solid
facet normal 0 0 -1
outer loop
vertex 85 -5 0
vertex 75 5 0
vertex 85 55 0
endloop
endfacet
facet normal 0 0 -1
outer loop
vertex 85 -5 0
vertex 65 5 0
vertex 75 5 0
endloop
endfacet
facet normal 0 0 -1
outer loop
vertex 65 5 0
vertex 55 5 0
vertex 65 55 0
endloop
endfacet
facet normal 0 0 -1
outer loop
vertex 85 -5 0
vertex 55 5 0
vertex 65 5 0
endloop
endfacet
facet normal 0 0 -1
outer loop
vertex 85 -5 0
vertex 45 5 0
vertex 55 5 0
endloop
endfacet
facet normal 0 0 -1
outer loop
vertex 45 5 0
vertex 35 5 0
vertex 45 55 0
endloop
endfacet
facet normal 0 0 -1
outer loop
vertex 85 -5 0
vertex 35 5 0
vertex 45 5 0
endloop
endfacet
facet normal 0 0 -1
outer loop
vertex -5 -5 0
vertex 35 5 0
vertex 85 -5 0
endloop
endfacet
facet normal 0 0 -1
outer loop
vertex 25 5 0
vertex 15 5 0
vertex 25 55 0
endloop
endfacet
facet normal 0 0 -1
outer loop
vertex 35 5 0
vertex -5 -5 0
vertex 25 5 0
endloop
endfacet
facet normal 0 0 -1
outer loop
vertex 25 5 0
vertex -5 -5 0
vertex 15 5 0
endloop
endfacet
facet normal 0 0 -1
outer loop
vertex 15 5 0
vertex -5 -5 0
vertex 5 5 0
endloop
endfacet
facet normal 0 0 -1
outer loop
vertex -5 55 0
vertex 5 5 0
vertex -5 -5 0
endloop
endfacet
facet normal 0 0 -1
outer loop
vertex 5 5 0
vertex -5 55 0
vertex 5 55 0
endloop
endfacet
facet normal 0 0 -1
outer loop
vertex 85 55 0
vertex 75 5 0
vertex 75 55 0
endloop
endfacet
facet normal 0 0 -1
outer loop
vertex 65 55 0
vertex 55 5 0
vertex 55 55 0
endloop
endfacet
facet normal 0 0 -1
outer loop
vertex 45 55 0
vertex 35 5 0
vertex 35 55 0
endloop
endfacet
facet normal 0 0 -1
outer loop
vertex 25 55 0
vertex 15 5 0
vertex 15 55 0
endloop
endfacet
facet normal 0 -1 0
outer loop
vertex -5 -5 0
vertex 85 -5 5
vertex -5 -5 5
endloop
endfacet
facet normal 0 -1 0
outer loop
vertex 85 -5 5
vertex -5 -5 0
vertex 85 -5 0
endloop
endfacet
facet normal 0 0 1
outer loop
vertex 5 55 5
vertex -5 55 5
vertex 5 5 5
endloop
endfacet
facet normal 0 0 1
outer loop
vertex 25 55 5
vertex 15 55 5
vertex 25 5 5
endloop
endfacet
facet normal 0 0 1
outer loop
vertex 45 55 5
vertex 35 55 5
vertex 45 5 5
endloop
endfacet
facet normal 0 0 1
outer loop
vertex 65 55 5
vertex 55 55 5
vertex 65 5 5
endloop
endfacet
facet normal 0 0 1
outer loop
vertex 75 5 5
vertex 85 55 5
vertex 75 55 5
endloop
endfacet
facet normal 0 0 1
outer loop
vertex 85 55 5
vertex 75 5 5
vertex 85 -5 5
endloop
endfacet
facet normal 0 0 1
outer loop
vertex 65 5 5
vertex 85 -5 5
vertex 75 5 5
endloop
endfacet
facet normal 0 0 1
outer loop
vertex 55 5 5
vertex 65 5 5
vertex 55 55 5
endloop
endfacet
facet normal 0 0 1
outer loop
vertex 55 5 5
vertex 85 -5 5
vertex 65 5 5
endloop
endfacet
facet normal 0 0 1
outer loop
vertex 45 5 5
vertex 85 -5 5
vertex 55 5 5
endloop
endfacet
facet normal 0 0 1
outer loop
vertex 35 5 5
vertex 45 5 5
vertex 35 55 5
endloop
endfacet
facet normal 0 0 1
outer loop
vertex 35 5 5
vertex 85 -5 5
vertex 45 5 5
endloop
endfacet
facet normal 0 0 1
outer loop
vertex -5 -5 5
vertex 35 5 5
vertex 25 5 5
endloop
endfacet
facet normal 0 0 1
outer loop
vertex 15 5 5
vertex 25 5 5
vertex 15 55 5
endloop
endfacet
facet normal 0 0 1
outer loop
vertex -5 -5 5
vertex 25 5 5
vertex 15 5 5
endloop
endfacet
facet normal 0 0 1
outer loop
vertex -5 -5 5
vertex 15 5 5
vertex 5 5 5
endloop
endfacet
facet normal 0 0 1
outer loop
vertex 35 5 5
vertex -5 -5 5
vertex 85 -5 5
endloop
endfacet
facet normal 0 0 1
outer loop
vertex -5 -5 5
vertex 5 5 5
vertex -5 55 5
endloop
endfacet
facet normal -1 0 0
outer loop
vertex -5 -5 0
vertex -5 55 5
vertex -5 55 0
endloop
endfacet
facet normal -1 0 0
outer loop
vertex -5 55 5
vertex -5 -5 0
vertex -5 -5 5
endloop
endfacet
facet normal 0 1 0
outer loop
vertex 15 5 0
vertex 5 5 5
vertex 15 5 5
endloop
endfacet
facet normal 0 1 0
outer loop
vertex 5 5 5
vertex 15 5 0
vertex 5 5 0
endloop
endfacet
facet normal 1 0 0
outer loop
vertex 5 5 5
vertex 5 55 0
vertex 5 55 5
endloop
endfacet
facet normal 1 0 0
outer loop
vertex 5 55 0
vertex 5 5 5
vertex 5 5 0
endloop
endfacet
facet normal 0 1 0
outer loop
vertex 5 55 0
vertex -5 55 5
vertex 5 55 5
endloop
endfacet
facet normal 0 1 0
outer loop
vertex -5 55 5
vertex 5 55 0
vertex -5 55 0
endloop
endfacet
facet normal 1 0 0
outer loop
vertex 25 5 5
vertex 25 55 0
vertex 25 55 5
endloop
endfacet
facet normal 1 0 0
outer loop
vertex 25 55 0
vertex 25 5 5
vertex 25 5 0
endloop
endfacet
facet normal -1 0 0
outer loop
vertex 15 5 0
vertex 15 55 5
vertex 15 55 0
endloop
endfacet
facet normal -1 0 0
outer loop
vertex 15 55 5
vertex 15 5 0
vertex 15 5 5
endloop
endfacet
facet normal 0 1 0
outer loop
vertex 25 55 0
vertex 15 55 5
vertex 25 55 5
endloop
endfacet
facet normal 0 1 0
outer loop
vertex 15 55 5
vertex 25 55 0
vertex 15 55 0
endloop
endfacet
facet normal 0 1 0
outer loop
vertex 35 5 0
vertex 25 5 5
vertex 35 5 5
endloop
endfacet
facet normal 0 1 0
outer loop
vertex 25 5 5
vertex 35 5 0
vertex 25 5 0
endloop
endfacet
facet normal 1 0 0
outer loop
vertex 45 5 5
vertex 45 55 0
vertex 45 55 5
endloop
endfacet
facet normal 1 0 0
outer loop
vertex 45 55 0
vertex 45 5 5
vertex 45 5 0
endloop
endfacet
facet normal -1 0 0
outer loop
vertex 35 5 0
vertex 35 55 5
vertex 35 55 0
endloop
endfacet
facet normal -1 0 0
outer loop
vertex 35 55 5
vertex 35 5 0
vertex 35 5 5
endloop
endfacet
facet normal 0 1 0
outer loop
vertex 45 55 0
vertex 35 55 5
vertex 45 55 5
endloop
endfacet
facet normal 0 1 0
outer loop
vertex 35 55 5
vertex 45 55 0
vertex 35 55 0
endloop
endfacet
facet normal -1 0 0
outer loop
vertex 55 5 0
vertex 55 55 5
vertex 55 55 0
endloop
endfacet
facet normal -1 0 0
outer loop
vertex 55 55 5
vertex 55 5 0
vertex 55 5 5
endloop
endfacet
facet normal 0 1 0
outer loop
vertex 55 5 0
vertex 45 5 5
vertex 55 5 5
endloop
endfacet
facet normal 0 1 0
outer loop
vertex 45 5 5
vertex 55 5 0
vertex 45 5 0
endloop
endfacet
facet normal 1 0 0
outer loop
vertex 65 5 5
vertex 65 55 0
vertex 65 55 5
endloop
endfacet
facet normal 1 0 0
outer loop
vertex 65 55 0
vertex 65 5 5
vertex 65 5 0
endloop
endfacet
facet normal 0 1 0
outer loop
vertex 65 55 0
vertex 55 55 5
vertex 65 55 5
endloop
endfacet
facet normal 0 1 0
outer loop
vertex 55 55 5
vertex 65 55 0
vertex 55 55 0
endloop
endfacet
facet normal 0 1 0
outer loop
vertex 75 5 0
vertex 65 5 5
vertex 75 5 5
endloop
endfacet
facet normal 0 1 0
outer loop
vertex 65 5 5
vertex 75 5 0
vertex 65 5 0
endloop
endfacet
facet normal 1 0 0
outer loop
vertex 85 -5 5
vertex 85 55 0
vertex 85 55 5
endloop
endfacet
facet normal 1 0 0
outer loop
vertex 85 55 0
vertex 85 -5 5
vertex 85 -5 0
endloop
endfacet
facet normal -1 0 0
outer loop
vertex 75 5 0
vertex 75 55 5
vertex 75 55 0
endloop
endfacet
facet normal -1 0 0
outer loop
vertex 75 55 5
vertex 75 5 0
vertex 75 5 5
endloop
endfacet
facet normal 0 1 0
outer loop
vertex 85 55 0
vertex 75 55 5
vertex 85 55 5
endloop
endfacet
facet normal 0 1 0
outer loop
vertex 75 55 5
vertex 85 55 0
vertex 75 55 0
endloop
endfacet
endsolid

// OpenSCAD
// file: ../../src/semi_regular/tess_4_8_8.scad
/*
    Tessella: Semi-Regular Tessellation - 4.8.8
    ===========================================
    This module implements the tessellation of a plane using a semi-regular tiling
    pattern defined by the vertex configuration 4.8.8, where one square and two
    octagons meet at each vertex.
*/

include <../tessUtils.scad>;

/**
 * @brief Generates center points for an octagonal grid.
 *
 * Creates a 2D grid of center points for octagons spaced by the octagon's side length.
 *
 * @param radius The radius of each octagon.
 * @param n The number of octagons along the x-axis.
 * @param m The number of octagons along the y-axis.
 * @param rotate (Optional) Boolean to apply rotation to the grid, default is true.
 * @return An array of center points for octagons.
 */
function octagons_centers_rect(
    radius,
    n,
    m
) =
    let (
        side_length = (radius * 2) / (sqrt(4 + 2 * sqrt(2))), // Side length of the octagon
        total_width = side_length * (1 + sqrt(2)) // Total width including spacing
    ) squares_centers_rect(total_width, n, m);

/**
 * @brief Generates center points for the squares in a 4.8.8 tiling grid.
 *
 * Aligns the square centers with the octagonal centers by using a shifted grid,
 * creating the required semi-regular tiling pattern.
 *
 * @param radius The radius of the octagons.
 * @param n The number of octagons along the x-axis.
 * @param m The number of octagons along the y-axis.
 * @return An array of center points for squares.
 */
function squares_8_8_centers_rect(radius, n, m) =
    let (
        side_length = (radius * 2) / (sqrt(4 + 2 * sqrt(2))), // Side length of the octagon
        total_width = side_length * (1 + sqrt(2)), // Total width including spacing
        shift_x = total_width / 2, // Horizontal shift for squares
        shift_y = total_width / 2 // Vertical shift for squares
    ) [for (c = squares_centers_rect(total_width, n - 1, m - 1)) [c[0] + shift_x, c[1] + shift_y]];

/**
 * @brief Generates vertices for octagons based on radius and center points.
 *
 * Generates the vertices for octagons based on the provided center points and radius.
 *
 * @param radius The radius of each octagon.
 * @param centers Array of center points.
 * @param angular_offset (Optional) Rotation angle for vertices, default is 22.5°.
 * @return Array of vertices for each octagon.
 */
function octagons_vertices(radius, centers, angular_offset = 22.5) =
    [
        for (center = centers) [
            for (i = [0:7]) let (
                angle = i * 45 + angular_offset
            ) [center[0] + radius * cos(angle), center[1] + radius * sin(angle)],
        ],
    ];
// file: ../../src/regular/triangles.scad
/*
    Tessella: Regular Tessellation - Triangles
    ==========================================
    This module implements the tessellation of a plane using regular triangles,
    where each tile is congruent, and all vertex angles around a point sum to 360°.

    Polygon properties:
    - Sides: 3
    - Interior Angle: 60°
    - Vertex Configuration: 3.3.3.3.3.3

    Mathematically valid because the interior angle divides 360° exactly.
    Reference: Euclidean tessellation theory for regular polygons.
*/

include <../tessUtils.scad>;

/**
 * @brief Generates center points for a "levels-based" triangle arrangement.
 *
 * Creates a roughly radial or diamond-like pattern of triangle centers. The center row
 * has (2*levels - 1) triangles, each additional row above/below decreases by 1 triangle.
 *
 * @param side   The side length of each equilateral triangle.
 * @param levels Number of levels away from the center row.
 * @return       An array of center points for triangles.
 */
function triangles_centers_radial(side, levels) =
    let (
        // Vertical height of each triangle
        vheight = side * sqrt(3) / 2,
        // Generate rows symmetrically around the center
        rows0 = [
            for (i = [-ceil(levels / 2 - 1):ceil(levels / 2 - 1)])
            let (
                rowCount = (levels - ( (levels + 1) % 2)) - abs(i), // Number of triangles in the row
                yOff = i * vheight, // Vertical offset for the row
                xStart = -(rowCount - 1) * side / 2 // Horizontal start to center the row
            ) [[xStart, yOff], rowCount],
        ],
        rows1 = (levels == 1) ? []
        : [
            for (i = [-(floor(levels / 2)):(floor(levels / 2 - 1))])
            let (
                rowCount = (levels - ( (levels) % 2)) - abs(i), // Number of triangles in the row
                yOff = i * vheight + vheight / 2 - (vheight - sqrt(3) / 3 * side) / 2, // Vertical offset for the row
                xStart = -(rowCount - 1) * side / 2 // Horizontal start to center the row
            ) [[xStart, yOff], rowCount],
        ],
        rows = concat(rows0, rows1)
    )
    // Generate center points for all rows
    [for (row = rows) for (j = [0:row[1] - 1]) [row[0][0] + j * side, row[0][1]]];

/**
 * @brief Generates center points for a rectangular grid of equilateral triangles (n x m).
 *
 * Alternating rows are horizontally offset by half a side for a typical triangular tiling pattern.
 *
 * @param side The side length of each triangle.
 * @param n    Number of triangles along x-axis.
 * @param m    Number of rows (y-axis).
 * @return     An array of center points for triangles.
 */
function triangles_centers_rect(side, n, m) =
    let (
        vheight = side * sqrt(3) / 2, // Vertical height of each triangle
        col_shift = side / 2, // Horizontal shift for each column
        row_shift = vheight, // Horizontal shift for alternating rows
        offset_shift = row_shift - (vheight - sqrt(3) / 3 * side) * 2
    ) [for (j = [0:m - 1], i = [0:n - 1]) [(i) * row_shift + (offset_shift * (j % 2)), j * col_shift]];

/**
 * @brief Generates vertices for equilateral triangles at specified centers.
 *
 * Rotates every other row by 180° and applies an additional angular offset for customization.
 *
 * @param side           The side length of each triangle.
 * @param centers        The array of center points for the triangles.
 * @param angular_offset An additional angular offset to apply to all triangles.
 * @param is_radial      If true, calculates the row index based on radial arrangement.
 * @return               A nested array of vertices for all triangles.
 */
function triangle_vertices(side, centers, angular_offset = 0, rect = true) =
    let (
        EPSILON = 1e-9, // Small value for floating-point comparison
        vheight = side * sqrt(3) / 2, // Vertical height of each triangle
        // This messy line pretty much determines if a row is odd or even based on the vertical position, it needs to check
        // using the reverse calculation of rows1 / offset shift, looking at that now it should probably be refactored.
        // Overall, this works and gets the geometrical idea across, but it's not the most readable (literally horrendous).
        row_parity = [
            for (c = centers) (
                (
                    ( ( ( (rect ? c[0] : c[1]) + EPSILON - vheight / 2 + (vheight - sqrt(3) / 3 * side) / 2) / vheight) % 1) <= EPSILON
                ) && (
                    (
                        ( ( (rect ? c[0] : c[1]) - EPSILON - vheight / 2 + (vheight - sqrt(3) / 3 * side) / 2) / vheight) % 1
                    ) >= -EPSILON
                ) ? 0
                : 1
            ),
        ], // Calculate row parity
        rotation_adjustment = [
            for (i = [0:len(centers) - 1]) (
                row_parity[i] ? (rect ? 0 : 180)
                : (rect ? 180 : 0)
            ),
        ] // Flip every other row
    ) [
            for (i = [0:len(centers) - 1]) [
                for (j = [0:2]) let (
                    angle = j * 120 + angular_offset + rotation_adjustment[i]
                ) [
                        centers[i][0] + side / sqrt(3) * cos(angle),
                        centers[i][1] + side / sqrt(3) * sin(angle),
                ],
            ],
    ];
// file: ../../src/regular/squares.scad
/*
    Tessella: Regular Tessellation - Squares
    ========================================
    This module implements the tessellation of a plane using regular squares,
    where each tile is congruent, and all vertex angles around a point sum to 360°.

    Polygon properties:
    - Sides: 4
    - Interior Angle: 90°
    - Vertex Configuration: 4.4.4.4
*/

include <../tessUtils.scad>;

/**
 * @brief Generates center points for a "levels-based" square arrangement.
 *
 * Creates a diamond-like pattern of square centers. The center (middle) row has (2*levels - 1) squares.
 * Each additional row above or below the center has one fewer square, until only 1 square remains at the
 * top and bottom (when levels > 1).
 *
 * @param side   The side length of each square.
 * @param levels Number of levels (rows above the center, plus the center, plus rows below).
 * @return       An array of center points for squares.
 */
function squares_centers_radial(side, levels) =
    let (
        // Offsets for spacing
        offset_x = side, // Horizontal spacing
        offset_y = side, // Vertical spacing

        // Generate rows from the center outward
        // Row i = -(levels-1) to +(levels-1), where i=0 is the center row.
        rows = [
            for (i = [-(levels - 1):(levels - 1)])
            let (
                rowCount = (2 * levels - 1) - abs(i), // Number of squares in the row
                yOff = i * offset_y, // Vertical position of the row
                xStart = -(rowCount - 1) * offset_x / 2 // Horizontal start to center the row
            ) [[xStart, yOff], rowCount],
        ]
    )
    // For each row definition, generate square center points
    [for (row = rows) for (j = [0:row[1] - 1]) [row[0][0] + j * offset_x, row[0][1]]];

/**
 * @brief Generates center points for a rectangular grid of squares (n x m).
 *
 * Produces a 2D grid of center points spaced by side length in both x and y directions.
 *
 * @param side The side length of each square.
 * @param n    The number of squares along the x-axis.
 * @param m    The number of squares along the y-axis.
 * @return     An array of center points for squares.
 */
function squares_centers_rect(side, n, m) =
    let (offset_x = side, offset_y = side) [for (ix = [0:n - 1], iy = [0:m - 1]) [ix * offset_x, iy * offset_y]];

/**
 * @brief Renders 2D squares at specified centers, with optional color gradient.
 *
 * @param side          The side length of each square.
 * @param spacing       (Optional) Spacing between squares, default is 0.
 * @param centers       (Optional) Array of center points. If empty, `levels` or (n,m) must be provided.
 * @param levels        (Optional) Number of levels for diamond-like pattern generation.
 * @param n, m          (Optional) Grid dimensions if using NxM generation.
 * @param color_scheme  (Optional) Name of the color scheme for gradient.
 * @param alpha         (Optional) Alpha transparency value.
 */

function squares_vertices(side, centers, angular_offset = 45) =
    [
        for (
            center = centers
        ) [
            for (i = [0:3]) let (angle = i * 90 + angular_offset) [
                    center[0] + side / sqrt(2) * cos(angle),
                    center[1] + side / sqrt(2) * sin(angle),
            ],
        ],
    ];
// file: ../../src/regular/hexagons.scad
/*
    Tessella: Regular Tessellation - Hexagons
    =========================================
    Tessellates a plane using regular hexagons.
    Properties:
    - Sides: 6
    - Interior Angle: 120°
    - Vertex Configuration: 6.6.6
*/

include <../tessUtils.scad>;

/**
 * Generates center points for a hexagonal tessellation in a radial pattern.
 * @param radius The radius of each hexagon.
 * @param levels Number of radial levels.
 * @return Array of hexagon center points.
 */
function hexagons_centers_radial(radius, levels) =
    let (
        offset_x = radius * cos(30),
        offset_y = radius + radius * sin(30),
        offset_step = 2 * offset_x,
        dx = -(levels - 1) * offset_x * 2,
        beginning_n = 2 * levels - 1,
        hexagons_pts = function(hex_datum)
        let (
            tx = hex_datum[0][0] + dx,
            ty = hex_datum[0][1],
            n_pts = hex_datum[1],
            offset_xs = [for (i = [0:n_pts - 1]) i * offset_step]
        ) [for (x = offset_xs) [x + tx, ty]],
        upper_hex_data = levels > 1 ? [
                for (i = [1:beginning_n - levels]) let (
                    x = offset_x * i,
                    y = offset_y * i,
                    n_upper = beginning_n - i
                ) [[x, y], n_upper],
            ]
        : [],
        lower_hex_data = levels > 1 ? [for (hex_datum = upper_hex_data) [[hex_datum[0][0], -hex_datum[0][1]], hex_datum[1]]]
        : [],
        total_hex_data = [[[0, 0], beginning_n], each upper_hex_data, each lower_hex_data],
        centers = [for (hex_datum = total_hex_data) hexagons_pts(hex_datum)]
    ) concat([for (c = centers) each c]);

/**
 * Generates center points for a rectangular hexagonal grid.
 * @param radius The radius of each hexagon.
 * @param n Number of hexagons along x-axis.
 * @param m Number of hexagons along y-axis.
 * @return Array of hexagon center points.
 */
function hexagons_centers_rect(radius, n, m) =
    let (
        offset_x = radius * cos(30),
        offset_y = radius + radius * sin(30),
        offset_step = 2 * offset_x
    ) [for (i = [0:n - 1], j = [0:m - 1]) [i * offset_step + (j % 2) * (offset_step / 2), j * offset_y]];

/**
 * Generates vertices for hexagons based on radius and center points.
 * @param radius The radius of each hexagon.
 * @param centers Array of center points.
 * @param angular_offset Rotation angle for vertices.
 * @return Array of vertices for each hexagon.
 */
function hexagons_vertices(radius, centers, angular_offset = 30) =
    [
        for (center = centers) [
            for (i = [0:5]) let (
                angle = i * 60 + angular_offset
            ) [center[0] + radius * cos(angle), center[1] + radius * sin(angle)],
        ],
    ];
// file: ../../src/tessUtils.scad
EPSILON = 1e-3; ///< Tolerance value used for floating-point comparisons.

/**
 * @brief Generates a gradient color based on normalized coordinates and a color scheme.
 *
 * Selects a color by mapping normalized x and y coordinates to RGB values according to the specified color scheme.
 *
 * @param normalized_x The normalized x-coordinate (0 to 1).
 * @param normalized_y The normalized y-coordinate (0 to 1).
 * @param color_scheme The name of the color scheme to use.
 * @return An RGB color array [r, g, b].
 */
function get_gradient_color(normalized_x, normalized_y, color_scheme) =
    color_scheme == "scheme1" ? [normalized_x, 1 - normalized_x, normalized_y]
    : // Red to Blue
    color_scheme == "scheme2" ? [1 - normalized_y, normalized_x, normalized_y]
    : // Green to Magenta
    color_scheme == "scheme3" ? [normalized_y, 1 - normalized_y, normalized_x]
    : // Blue to Yellow
    color_scheme == "scheme4" ? [1 - normalized_x, normalized_x, 1 - normalized_y]
    : // Cyan to Red
    color_scheme == "scheme5" ? [normalized_x, normalized_x * normalized_y, 1 - normalized_x]
    : // Purple to Green
    color_scheme == "scheme6" ? [1 - normalized_x * normalized_y, normalized_y, normalized_x]
    : // Orange to Blue
    [0.9, 0.9, 0.9]; // Default color (grey) if no valid color scheme is provided

/**
 * @brief Renders points as text labels and optional spheres in the 3D space.
 *
 * Displays each point's coordinates as text at its location and optionally places a sphere at the point.
 *
 * @param points An array of points to display, each as [x, y].
 * @param text_size (Optional) Size of the text labels; default is 1.
 * @param color (Optional) Color of the text labels; default is [0.1, 0.1, 0.1].
 * @param pointD (Optional) Diameter of the sphere to place at each point; if undef, no sphere is placed.
 * @param point_color (Optional) Color of the spheres; default is [0.1, 0.1, 0.1].
 * @param fn (Optional) Number of facets for the spheres; default is 8.
 */
module print_points(
    points,
    text_size = 1,
    color = [0.1, 0.1, 0.1],
    pointD = undef,
    point_color = [0.1, 0.1, 0.1],
    fn = 8
) {
    for (point = points) {
        // Translate +1 in Z-axis to avoid z-fighting with the surface
        translate([point[0], point[1] + pointD * 2, pointD * 2]) color(color)
                text(str("[", point[0], ", ", point[1], "]"), size=text_size, valign="center", halign="center");
        if (pointD != undef) {
            // Place a sphere at the point if pointD is specified
            color(point_color) translate([point[0], point[1], 0]) sphere(pointD, $fn=fn);
        }
    }
}

/**
 * @brief Checks if two points are equal within a specified tolerance.
 *
 * @param p1 First point as [x, y].
 * @param p2 Second point as [x, y].
 * @param tolerance (Optional) Tolerance value for comparison; default is EPSILON.
 * @return True if points are equal within tolerance, false otherwise.
 */
function points_equal(p1, p2, tolerance = EPSILON) =
    let (
        comparisons = [
            for (i = [0:len(p1) - 1]) abs(p1[i] - p2[i]) < tolerance,
        ]
    )
    // Check if all comparisons are true
    len([for (comp = comparisons) if (comp) true]) == len(comparisons);

/**
 * @brief Checks if a point exists within a list of points, within a specified tolerance.
 *
 * @param point The point to check, as [x, y].
 * @param list The list of points to search within.
 * @param tolerance (Optional) Tolerance value for comparison; default is EPSILON.
 * @return True if the point exists in the list within tolerance, false otherwise.
 */
function is_point_in_list(
    point,
    list,
    tolerance = EPSILON
) =
    let (equal_points = [for (p = list) points_equal(p, point, tolerance)]) len([for (eq = equal_points) if (eq) true]) > 0;

/**
 * @brief Filters out centers that are present in a filter list.
 *
 * Removes centers from the provided list that match any in the filter_list, within a specified tolerance.
 *
 * @param centers An array of centers to be filtered.
 * @param filter_list An array of centers to filter out.
 * @param tolerance (Optional) Tolerance value for comparison; default is EPSILON.
 * @return A filtered array of centers.
 */
function filter_center_points(centers, filter_list, tolerance = EPSILON) =
    [for (center = centers) if (!is_point_in_list(center, filter_list, tolerance)) center];

/** 
 * @brief Renders a generic polygon shape with optional extrusion and color gradient.
 *
 * This module allows rendering of polygons defined by vertices and paths, with optional extrusion for 3D effects.
 * It supports color gradients based on center points and a specified color scheme.
 *
 * @param vertices An array of vertices for the polygon.    
 * @param paths An array of paths defining the polygon.
 * @param centers (Optional) An array of center points for each polygon, used for color gradient.
 * @param color_scheme (Optional) A string defining the color scheme for the gradient.
 * @param alpha (Optional) Transparency level for the color; default is 1 (opaque).
 * @param extrude (Optional) Height for linear extrusion; if undef, no extrusion is applied.
 * @return Renders the polygon with the specified properties.
 */

module generic_poly(vertices, paths, centers = undef, color_scheme = undef, alpha = 1, extrude = undef) {
    if (!is_undef(color_scheme) && !is_undef(centers)) {
        // Compute normalization bounds
        min_x = min([for (center = centers) center[0]]);
        max_x = max([for (center = centers) center[0]]);
        min_y = min([for (center = centers) center[1]]);
        max_y = max([for (center = centers) center[1]]);

        for (i = [0:len(vertices) - 1]) {
            // Normalize coordinates for color gradient
            normalized_x = (centers[i][0] - min_x) / (max_x - min_x + 1e-9);
            normalized_y = (centers[i][1] - min_y) / (max_y - min_y + 1e-9);

            // Get color value
            color_val = get_gradient_color(normalized_x, normalized_y, color_scheme);

            // Render the shape
            color(color_val, alpha=alpha) if (!is_undef(extrude))
                linear_extrude(height=extrude)
                    polygon(points=vertices[i], paths=paths);
            else
                polygon(points=vertices[i], paths=paths);
        }
    } else {
        for (i = [0:len(vertices) - 1]) {
            // Render the shape without a color gradient
            if (!is_undef(extrude))
                linear_extrude(height=extrude) polygon(points=vertices[i], paths=paths);
            else
                polygon(points=vertices[i], paths=paths);
        }
    }
}
// file: ../../tess.scad
/**
 * @file tess.scad
 * @brief Functions and modules for generating tessellation patterns and rendering shapes.
 * @author Cameron K. Brooks
 * @copyright 2024
 * @info This file serves as an index file to allow for blind importing of all tessellation modules.
 *
 */

// Import utility modules
include <src/tessUtils.scad>

// Import regular tessellation modules

include <src/regular/hexagons.scad>; // Contains hexagon tessellation functions & assets
include <src/regular/squares.scad>; // Contains square tessellation functions & assets
include <src/regular/triangles.scad>; // Contains triangle tessellation functions & assets

// Import semi-regular (Archimedean) tessellation modules
include <src/semi_regular/tess_4_8_8.scad>; // Contains 4.8.8 tessellation functions & octagon assets
// main file
// Rectangular squares
// A 9 × 6 grid with every other column removed above the bottom row, leaving a comb.

use <../../tess.scad>

side = 10; // Side length of each square
spacing = 0; // Spacing between squares
n = 9; // Number of squares along the x-axis
m = 6; // Number of squares along the y-axis
extHeight = 10; // Extrusion height for squares
filter = true; // Enable or disable filtering

// Generate unfiltered center points
unfiltered_centers = squares_centers_rect(side, n, m);
echo("Unfiltered Centers Grid:", unfiltered_centers);

// Define filter points for the rectangular grid
filter_points = [
    [10, 10],
    [10, 20],
    [10, 30],
    [10, 40],
    [10, 50],
    [30, 10],
    [30, 20],
    [30, 30],
    [30, 40],
    [30, 50],
    [50, 10],
    [50, 20],
    [50, 30],
    [50, 40],
    [50, 50],
    [70, 10],
    [70, 20],
    [70, 30],
    [70, 40],
    [70, 50],
];

// Filter the center points if filtering is enabled
filtered_centers = filter_center_points(unfiltered_centers, filter_points);
echo("Filtered Centers Grid:", filtered_centers);

// Use filtered or unfiltered center points
centers = filter ? filtered_centers : unfiltered_centers;

// Generate vertices for the squares
vertices = squares_vertices(side=side - spacing, centers=centers);

// Render the squares
generic_poly(
    vertices=vertices, paths=[[0, 1, 2, 3, 0]], centers=centers, color_scheme="scheme1", alpha=1,
    extrude=5
);
// Note:
// - The 'centers' parameter is used only for calculating the color scheme.
//   If no color scheme is needed, this parameter can be omitted.
// - The 'vertices' parameter is mandatory for defining the geometry of the tessellation.
// - The 'paths' parameter defines the connectivity of vertices to form each shape.
//   For example, [[0, 1, 2, 3, 0]] represents a square connecting vertices in order.
// - If only a flat visualization of the tessellation is required, the 'extrude' parameter can be omitted.
//   For example:
//   generic_poly(vertices = vertices, paths = [[0, 1, 2, 3, 0]]);

// Render points for debugging
translate([0, 0, extHeight])
    print_points(centers, text_size=1, color="Black", pointD=0.5, point_color="Red", fn=12);
